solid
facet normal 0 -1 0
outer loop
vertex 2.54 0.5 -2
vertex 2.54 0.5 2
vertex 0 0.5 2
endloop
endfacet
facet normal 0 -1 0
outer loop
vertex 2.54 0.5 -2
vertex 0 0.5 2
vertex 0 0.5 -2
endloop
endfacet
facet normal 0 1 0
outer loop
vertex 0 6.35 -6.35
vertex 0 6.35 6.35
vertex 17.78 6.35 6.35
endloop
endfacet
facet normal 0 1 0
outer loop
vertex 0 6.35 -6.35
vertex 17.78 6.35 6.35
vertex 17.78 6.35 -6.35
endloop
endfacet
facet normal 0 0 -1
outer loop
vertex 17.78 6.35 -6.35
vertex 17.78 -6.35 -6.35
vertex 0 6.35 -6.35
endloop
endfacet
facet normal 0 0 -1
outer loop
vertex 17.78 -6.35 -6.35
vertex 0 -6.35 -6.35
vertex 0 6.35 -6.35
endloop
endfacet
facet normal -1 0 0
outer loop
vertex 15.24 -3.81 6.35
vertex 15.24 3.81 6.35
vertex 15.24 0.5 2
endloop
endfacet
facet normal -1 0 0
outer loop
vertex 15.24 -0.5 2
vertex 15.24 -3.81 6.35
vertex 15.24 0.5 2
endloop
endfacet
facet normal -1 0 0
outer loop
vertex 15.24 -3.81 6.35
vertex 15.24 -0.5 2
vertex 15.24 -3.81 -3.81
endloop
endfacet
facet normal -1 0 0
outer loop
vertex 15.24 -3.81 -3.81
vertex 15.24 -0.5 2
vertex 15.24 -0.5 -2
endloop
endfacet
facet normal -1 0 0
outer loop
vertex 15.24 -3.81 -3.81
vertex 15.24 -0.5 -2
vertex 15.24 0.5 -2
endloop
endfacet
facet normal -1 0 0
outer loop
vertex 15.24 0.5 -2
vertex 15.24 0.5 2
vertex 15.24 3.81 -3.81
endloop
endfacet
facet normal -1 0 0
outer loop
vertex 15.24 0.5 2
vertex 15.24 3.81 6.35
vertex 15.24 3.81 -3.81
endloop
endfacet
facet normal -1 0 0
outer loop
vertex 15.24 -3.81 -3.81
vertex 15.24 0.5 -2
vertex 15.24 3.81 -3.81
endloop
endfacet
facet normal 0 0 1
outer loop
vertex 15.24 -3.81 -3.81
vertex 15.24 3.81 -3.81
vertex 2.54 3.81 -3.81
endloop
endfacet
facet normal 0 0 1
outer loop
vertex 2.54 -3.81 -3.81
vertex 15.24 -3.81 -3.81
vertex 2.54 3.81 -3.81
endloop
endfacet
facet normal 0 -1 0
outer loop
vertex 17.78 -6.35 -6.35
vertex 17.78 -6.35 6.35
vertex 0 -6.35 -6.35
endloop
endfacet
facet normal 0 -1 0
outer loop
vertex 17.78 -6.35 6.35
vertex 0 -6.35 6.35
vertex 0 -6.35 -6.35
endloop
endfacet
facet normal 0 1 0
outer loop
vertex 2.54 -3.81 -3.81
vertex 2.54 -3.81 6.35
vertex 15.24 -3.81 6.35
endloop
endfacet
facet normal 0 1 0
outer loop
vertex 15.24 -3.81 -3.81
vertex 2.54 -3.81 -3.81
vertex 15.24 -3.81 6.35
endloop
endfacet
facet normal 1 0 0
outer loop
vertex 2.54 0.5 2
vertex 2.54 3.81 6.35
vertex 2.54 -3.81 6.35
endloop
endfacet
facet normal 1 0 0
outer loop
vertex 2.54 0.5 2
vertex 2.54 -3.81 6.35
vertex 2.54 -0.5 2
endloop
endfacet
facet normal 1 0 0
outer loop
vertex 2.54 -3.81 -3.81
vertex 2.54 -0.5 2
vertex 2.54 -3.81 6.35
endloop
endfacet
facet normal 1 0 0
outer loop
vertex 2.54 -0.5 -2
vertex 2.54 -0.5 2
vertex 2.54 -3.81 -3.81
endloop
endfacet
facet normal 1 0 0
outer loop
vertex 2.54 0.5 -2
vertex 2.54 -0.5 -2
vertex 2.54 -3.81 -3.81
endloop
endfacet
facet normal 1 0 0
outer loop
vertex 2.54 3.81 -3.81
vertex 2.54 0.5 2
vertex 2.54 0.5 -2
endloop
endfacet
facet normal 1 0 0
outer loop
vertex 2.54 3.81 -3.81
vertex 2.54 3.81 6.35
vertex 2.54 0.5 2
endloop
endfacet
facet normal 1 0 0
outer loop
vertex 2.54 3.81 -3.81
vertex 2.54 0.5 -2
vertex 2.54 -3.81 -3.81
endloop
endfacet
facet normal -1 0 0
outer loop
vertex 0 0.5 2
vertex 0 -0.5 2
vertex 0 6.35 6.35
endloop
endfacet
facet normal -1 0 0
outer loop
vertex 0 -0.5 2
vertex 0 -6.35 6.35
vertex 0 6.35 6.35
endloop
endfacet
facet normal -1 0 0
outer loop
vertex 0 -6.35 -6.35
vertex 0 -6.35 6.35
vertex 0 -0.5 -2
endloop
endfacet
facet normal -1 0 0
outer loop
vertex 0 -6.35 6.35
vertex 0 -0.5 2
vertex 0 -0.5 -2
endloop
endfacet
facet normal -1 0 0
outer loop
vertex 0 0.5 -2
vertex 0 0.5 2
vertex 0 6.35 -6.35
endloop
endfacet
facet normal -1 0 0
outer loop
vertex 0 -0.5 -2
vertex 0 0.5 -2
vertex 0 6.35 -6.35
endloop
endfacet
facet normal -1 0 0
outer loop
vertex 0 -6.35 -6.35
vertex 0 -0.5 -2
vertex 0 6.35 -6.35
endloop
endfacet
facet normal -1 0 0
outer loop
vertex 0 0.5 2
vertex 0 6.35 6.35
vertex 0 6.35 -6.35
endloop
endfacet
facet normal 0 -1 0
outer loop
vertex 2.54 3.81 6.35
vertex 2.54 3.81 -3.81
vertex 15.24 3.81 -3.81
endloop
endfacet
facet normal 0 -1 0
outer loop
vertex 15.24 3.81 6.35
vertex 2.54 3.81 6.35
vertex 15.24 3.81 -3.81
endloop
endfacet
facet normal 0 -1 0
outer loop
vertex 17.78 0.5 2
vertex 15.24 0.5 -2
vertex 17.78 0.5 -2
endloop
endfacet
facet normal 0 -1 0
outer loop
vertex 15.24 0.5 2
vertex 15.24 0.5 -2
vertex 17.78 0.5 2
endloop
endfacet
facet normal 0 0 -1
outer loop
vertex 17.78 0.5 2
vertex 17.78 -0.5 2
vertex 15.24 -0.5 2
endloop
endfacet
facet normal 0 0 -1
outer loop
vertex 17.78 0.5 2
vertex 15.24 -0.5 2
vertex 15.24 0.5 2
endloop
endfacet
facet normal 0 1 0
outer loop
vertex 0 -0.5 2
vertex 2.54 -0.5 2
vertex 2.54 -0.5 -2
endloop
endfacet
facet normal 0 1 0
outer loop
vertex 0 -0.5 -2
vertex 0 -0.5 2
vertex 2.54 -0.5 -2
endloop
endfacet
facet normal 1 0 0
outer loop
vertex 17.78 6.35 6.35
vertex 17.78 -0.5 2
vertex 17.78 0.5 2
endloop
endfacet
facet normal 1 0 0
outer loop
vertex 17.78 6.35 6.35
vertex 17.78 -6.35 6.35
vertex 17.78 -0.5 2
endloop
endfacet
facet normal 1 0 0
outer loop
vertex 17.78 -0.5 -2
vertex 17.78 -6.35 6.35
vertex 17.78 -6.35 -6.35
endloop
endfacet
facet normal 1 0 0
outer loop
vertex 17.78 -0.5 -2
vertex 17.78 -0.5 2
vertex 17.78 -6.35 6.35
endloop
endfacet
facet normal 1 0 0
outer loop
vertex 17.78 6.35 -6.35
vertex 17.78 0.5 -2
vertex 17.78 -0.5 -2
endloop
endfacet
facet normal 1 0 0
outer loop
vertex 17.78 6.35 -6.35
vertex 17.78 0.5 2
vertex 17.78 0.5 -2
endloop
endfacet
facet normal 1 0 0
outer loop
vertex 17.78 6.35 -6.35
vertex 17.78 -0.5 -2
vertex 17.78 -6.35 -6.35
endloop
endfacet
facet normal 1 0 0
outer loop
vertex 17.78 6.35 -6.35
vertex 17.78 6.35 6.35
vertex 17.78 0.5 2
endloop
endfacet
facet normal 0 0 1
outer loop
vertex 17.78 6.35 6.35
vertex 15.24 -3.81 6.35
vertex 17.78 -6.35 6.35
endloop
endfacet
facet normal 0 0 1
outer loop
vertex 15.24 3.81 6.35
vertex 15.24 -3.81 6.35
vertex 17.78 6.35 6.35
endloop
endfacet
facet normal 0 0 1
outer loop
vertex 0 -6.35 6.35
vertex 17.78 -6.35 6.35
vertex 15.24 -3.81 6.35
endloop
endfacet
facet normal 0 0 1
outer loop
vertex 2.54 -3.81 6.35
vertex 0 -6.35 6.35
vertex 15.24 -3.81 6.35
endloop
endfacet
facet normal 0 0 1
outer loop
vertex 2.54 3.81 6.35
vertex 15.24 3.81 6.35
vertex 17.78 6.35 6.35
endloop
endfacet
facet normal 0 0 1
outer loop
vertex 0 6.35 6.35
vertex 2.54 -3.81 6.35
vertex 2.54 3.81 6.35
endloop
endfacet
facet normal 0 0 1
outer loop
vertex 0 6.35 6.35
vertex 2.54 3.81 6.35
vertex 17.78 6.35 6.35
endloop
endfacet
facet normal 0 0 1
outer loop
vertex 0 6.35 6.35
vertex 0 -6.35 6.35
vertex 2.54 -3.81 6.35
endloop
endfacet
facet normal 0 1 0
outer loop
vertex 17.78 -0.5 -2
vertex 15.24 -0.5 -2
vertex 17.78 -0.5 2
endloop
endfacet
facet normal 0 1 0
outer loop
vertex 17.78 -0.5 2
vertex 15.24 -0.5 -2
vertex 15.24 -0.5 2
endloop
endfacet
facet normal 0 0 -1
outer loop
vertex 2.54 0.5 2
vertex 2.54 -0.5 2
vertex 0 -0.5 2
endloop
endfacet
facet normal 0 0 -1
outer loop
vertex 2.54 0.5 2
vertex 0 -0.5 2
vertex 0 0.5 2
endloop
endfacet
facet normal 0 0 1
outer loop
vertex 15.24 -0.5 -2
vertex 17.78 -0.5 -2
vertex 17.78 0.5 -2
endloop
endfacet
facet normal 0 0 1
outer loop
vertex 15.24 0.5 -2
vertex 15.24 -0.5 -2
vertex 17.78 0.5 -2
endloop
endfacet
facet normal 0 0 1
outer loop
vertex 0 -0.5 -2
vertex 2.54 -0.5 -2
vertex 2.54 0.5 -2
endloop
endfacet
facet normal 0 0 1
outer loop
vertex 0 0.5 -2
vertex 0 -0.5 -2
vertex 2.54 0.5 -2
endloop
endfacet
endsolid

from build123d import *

# Parameters (mm, degrees)
IZIM1_W                     = 12.7
IZIM1_H                     = 12.7
Y_KSEKLIK_EKSTR_ZYON1_DEPTH = 2.54
IZIM2_W                     = 4
IZIM2_H                     = 1
KES_EKSTR_ZYON1_DEPTH       = 2.54
IZIM3_W                     = 12.7
IZIM3_H                     = 12.7
Y_KSEKLIK_EKSTR_ZYON2_DEPTH = 2.54
IZIM4_W                     = 12.7
IZIM4_H                     = 12.7
Y_KSEKLIK_EKSTR_ZYON3_DEPTH = 2.54
IZIM5_W                     = 12.7
IZIM5_H                     = 7.62
Y_KSEKLIK_EKSTR_ZYON4_DEPTH = 2.54
IZIM7_W                     = 12.7
IZIM7_H                     = 12.7
Y_KSEKLIK_EKSTR_ZYON6_DEPTH = 2.54
IZIM8_W                     = 4
IZIM8_H                     = 1
KES_EKSTR_ZYON2_DEPTH       = 2.54


with BuildPart() as part:
    # Çizim1 → Yükseklik-Ekstrüzyon1 (new body)
    with BuildSketch(Plane(origin=(0, 0, 0), x_dir=(0, 0, -1), z_dir=(1, 0, 0))):
        Rectangle(IZIM1_W, IZIM1_H)
    extrude(amount=Y_KSEKLIK_EKSTR_ZYON1_DEPTH)

    # Çizim2 → Kes-Ekstrüzyon1 (cut)
    with BuildSketch(Plane(origin=(2.54, 0, 0), x_dir=(0, 0, -1), z_dir=(1, 0, 0))):
        Rectangle(IZIM2_W, IZIM2_H)
    extrude(amount=-KES_EKSTR_ZYON1_DEPTH, mode=Mode.SUBTRACT)

    # Çizim3 → Yükseklik-Ekstrüzyon2 (add)
    with BuildSketch(Plane(origin=(0, 6.35, 0), x_dir=(1, 0, 0), z_dir=(0, 1, 0))):
        with Locations((8.89, 0)):
            Rectangle(IZIM3_W, IZIM3_H)
    extrude(amount=-Y_KSEKLIK_EKSTR_ZYON2_DEPTH)

    # Çizim4 → Yükseklik-Ekstrüzyon3 (add)
    with BuildSketch(Plane.XZ.offset(6.35)):
        with Locations((8.89, 0)):
            Rectangle(IZIM4_W, IZIM4_H)
    extrude(amount=-Y_KSEKLIK_EKSTR_ZYON3_DEPTH)

    # Çizim5 → Yükseklik-Ekstrüzyon4 (add)
    with BuildSketch(Plane(origin=(0, 0, -6.35), x_dir=(-1, 0, 0), z_dir=(0, 0, -1))):
        with Locations((-8.89, 0)):
            Rectangle(IZIM5_W, IZIM5_H)
    extrude(amount=-Y_KSEKLIK_EKSTR_ZYON4_DEPTH)

    # Çizim7 → Yükseklik-Ekstrüzyon6 (add)
    with BuildSketch(Plane(origin=(15.24, 0, 0), x_dir=(0, 0, -1), z_dir=(1, 0, 0))):
        Rectangle(IZIM7_W, IZIM7_H)
    extrude(amount=Y_KSEKLIK_EKSTR_ZYON6_DEPTH)

    # Çizim8 → Kes-Ekstrüzyon2 (cut)
    with BuildSketch(Plane.ZY.offset(-15.24)):
        Rectangle(IZIM8_W, IZIM8_H)
    extrude(amount=-KES_EKSTR_ZYON2_DEPTH, mode=Mode.SUBTRACT)


solid = part.part
